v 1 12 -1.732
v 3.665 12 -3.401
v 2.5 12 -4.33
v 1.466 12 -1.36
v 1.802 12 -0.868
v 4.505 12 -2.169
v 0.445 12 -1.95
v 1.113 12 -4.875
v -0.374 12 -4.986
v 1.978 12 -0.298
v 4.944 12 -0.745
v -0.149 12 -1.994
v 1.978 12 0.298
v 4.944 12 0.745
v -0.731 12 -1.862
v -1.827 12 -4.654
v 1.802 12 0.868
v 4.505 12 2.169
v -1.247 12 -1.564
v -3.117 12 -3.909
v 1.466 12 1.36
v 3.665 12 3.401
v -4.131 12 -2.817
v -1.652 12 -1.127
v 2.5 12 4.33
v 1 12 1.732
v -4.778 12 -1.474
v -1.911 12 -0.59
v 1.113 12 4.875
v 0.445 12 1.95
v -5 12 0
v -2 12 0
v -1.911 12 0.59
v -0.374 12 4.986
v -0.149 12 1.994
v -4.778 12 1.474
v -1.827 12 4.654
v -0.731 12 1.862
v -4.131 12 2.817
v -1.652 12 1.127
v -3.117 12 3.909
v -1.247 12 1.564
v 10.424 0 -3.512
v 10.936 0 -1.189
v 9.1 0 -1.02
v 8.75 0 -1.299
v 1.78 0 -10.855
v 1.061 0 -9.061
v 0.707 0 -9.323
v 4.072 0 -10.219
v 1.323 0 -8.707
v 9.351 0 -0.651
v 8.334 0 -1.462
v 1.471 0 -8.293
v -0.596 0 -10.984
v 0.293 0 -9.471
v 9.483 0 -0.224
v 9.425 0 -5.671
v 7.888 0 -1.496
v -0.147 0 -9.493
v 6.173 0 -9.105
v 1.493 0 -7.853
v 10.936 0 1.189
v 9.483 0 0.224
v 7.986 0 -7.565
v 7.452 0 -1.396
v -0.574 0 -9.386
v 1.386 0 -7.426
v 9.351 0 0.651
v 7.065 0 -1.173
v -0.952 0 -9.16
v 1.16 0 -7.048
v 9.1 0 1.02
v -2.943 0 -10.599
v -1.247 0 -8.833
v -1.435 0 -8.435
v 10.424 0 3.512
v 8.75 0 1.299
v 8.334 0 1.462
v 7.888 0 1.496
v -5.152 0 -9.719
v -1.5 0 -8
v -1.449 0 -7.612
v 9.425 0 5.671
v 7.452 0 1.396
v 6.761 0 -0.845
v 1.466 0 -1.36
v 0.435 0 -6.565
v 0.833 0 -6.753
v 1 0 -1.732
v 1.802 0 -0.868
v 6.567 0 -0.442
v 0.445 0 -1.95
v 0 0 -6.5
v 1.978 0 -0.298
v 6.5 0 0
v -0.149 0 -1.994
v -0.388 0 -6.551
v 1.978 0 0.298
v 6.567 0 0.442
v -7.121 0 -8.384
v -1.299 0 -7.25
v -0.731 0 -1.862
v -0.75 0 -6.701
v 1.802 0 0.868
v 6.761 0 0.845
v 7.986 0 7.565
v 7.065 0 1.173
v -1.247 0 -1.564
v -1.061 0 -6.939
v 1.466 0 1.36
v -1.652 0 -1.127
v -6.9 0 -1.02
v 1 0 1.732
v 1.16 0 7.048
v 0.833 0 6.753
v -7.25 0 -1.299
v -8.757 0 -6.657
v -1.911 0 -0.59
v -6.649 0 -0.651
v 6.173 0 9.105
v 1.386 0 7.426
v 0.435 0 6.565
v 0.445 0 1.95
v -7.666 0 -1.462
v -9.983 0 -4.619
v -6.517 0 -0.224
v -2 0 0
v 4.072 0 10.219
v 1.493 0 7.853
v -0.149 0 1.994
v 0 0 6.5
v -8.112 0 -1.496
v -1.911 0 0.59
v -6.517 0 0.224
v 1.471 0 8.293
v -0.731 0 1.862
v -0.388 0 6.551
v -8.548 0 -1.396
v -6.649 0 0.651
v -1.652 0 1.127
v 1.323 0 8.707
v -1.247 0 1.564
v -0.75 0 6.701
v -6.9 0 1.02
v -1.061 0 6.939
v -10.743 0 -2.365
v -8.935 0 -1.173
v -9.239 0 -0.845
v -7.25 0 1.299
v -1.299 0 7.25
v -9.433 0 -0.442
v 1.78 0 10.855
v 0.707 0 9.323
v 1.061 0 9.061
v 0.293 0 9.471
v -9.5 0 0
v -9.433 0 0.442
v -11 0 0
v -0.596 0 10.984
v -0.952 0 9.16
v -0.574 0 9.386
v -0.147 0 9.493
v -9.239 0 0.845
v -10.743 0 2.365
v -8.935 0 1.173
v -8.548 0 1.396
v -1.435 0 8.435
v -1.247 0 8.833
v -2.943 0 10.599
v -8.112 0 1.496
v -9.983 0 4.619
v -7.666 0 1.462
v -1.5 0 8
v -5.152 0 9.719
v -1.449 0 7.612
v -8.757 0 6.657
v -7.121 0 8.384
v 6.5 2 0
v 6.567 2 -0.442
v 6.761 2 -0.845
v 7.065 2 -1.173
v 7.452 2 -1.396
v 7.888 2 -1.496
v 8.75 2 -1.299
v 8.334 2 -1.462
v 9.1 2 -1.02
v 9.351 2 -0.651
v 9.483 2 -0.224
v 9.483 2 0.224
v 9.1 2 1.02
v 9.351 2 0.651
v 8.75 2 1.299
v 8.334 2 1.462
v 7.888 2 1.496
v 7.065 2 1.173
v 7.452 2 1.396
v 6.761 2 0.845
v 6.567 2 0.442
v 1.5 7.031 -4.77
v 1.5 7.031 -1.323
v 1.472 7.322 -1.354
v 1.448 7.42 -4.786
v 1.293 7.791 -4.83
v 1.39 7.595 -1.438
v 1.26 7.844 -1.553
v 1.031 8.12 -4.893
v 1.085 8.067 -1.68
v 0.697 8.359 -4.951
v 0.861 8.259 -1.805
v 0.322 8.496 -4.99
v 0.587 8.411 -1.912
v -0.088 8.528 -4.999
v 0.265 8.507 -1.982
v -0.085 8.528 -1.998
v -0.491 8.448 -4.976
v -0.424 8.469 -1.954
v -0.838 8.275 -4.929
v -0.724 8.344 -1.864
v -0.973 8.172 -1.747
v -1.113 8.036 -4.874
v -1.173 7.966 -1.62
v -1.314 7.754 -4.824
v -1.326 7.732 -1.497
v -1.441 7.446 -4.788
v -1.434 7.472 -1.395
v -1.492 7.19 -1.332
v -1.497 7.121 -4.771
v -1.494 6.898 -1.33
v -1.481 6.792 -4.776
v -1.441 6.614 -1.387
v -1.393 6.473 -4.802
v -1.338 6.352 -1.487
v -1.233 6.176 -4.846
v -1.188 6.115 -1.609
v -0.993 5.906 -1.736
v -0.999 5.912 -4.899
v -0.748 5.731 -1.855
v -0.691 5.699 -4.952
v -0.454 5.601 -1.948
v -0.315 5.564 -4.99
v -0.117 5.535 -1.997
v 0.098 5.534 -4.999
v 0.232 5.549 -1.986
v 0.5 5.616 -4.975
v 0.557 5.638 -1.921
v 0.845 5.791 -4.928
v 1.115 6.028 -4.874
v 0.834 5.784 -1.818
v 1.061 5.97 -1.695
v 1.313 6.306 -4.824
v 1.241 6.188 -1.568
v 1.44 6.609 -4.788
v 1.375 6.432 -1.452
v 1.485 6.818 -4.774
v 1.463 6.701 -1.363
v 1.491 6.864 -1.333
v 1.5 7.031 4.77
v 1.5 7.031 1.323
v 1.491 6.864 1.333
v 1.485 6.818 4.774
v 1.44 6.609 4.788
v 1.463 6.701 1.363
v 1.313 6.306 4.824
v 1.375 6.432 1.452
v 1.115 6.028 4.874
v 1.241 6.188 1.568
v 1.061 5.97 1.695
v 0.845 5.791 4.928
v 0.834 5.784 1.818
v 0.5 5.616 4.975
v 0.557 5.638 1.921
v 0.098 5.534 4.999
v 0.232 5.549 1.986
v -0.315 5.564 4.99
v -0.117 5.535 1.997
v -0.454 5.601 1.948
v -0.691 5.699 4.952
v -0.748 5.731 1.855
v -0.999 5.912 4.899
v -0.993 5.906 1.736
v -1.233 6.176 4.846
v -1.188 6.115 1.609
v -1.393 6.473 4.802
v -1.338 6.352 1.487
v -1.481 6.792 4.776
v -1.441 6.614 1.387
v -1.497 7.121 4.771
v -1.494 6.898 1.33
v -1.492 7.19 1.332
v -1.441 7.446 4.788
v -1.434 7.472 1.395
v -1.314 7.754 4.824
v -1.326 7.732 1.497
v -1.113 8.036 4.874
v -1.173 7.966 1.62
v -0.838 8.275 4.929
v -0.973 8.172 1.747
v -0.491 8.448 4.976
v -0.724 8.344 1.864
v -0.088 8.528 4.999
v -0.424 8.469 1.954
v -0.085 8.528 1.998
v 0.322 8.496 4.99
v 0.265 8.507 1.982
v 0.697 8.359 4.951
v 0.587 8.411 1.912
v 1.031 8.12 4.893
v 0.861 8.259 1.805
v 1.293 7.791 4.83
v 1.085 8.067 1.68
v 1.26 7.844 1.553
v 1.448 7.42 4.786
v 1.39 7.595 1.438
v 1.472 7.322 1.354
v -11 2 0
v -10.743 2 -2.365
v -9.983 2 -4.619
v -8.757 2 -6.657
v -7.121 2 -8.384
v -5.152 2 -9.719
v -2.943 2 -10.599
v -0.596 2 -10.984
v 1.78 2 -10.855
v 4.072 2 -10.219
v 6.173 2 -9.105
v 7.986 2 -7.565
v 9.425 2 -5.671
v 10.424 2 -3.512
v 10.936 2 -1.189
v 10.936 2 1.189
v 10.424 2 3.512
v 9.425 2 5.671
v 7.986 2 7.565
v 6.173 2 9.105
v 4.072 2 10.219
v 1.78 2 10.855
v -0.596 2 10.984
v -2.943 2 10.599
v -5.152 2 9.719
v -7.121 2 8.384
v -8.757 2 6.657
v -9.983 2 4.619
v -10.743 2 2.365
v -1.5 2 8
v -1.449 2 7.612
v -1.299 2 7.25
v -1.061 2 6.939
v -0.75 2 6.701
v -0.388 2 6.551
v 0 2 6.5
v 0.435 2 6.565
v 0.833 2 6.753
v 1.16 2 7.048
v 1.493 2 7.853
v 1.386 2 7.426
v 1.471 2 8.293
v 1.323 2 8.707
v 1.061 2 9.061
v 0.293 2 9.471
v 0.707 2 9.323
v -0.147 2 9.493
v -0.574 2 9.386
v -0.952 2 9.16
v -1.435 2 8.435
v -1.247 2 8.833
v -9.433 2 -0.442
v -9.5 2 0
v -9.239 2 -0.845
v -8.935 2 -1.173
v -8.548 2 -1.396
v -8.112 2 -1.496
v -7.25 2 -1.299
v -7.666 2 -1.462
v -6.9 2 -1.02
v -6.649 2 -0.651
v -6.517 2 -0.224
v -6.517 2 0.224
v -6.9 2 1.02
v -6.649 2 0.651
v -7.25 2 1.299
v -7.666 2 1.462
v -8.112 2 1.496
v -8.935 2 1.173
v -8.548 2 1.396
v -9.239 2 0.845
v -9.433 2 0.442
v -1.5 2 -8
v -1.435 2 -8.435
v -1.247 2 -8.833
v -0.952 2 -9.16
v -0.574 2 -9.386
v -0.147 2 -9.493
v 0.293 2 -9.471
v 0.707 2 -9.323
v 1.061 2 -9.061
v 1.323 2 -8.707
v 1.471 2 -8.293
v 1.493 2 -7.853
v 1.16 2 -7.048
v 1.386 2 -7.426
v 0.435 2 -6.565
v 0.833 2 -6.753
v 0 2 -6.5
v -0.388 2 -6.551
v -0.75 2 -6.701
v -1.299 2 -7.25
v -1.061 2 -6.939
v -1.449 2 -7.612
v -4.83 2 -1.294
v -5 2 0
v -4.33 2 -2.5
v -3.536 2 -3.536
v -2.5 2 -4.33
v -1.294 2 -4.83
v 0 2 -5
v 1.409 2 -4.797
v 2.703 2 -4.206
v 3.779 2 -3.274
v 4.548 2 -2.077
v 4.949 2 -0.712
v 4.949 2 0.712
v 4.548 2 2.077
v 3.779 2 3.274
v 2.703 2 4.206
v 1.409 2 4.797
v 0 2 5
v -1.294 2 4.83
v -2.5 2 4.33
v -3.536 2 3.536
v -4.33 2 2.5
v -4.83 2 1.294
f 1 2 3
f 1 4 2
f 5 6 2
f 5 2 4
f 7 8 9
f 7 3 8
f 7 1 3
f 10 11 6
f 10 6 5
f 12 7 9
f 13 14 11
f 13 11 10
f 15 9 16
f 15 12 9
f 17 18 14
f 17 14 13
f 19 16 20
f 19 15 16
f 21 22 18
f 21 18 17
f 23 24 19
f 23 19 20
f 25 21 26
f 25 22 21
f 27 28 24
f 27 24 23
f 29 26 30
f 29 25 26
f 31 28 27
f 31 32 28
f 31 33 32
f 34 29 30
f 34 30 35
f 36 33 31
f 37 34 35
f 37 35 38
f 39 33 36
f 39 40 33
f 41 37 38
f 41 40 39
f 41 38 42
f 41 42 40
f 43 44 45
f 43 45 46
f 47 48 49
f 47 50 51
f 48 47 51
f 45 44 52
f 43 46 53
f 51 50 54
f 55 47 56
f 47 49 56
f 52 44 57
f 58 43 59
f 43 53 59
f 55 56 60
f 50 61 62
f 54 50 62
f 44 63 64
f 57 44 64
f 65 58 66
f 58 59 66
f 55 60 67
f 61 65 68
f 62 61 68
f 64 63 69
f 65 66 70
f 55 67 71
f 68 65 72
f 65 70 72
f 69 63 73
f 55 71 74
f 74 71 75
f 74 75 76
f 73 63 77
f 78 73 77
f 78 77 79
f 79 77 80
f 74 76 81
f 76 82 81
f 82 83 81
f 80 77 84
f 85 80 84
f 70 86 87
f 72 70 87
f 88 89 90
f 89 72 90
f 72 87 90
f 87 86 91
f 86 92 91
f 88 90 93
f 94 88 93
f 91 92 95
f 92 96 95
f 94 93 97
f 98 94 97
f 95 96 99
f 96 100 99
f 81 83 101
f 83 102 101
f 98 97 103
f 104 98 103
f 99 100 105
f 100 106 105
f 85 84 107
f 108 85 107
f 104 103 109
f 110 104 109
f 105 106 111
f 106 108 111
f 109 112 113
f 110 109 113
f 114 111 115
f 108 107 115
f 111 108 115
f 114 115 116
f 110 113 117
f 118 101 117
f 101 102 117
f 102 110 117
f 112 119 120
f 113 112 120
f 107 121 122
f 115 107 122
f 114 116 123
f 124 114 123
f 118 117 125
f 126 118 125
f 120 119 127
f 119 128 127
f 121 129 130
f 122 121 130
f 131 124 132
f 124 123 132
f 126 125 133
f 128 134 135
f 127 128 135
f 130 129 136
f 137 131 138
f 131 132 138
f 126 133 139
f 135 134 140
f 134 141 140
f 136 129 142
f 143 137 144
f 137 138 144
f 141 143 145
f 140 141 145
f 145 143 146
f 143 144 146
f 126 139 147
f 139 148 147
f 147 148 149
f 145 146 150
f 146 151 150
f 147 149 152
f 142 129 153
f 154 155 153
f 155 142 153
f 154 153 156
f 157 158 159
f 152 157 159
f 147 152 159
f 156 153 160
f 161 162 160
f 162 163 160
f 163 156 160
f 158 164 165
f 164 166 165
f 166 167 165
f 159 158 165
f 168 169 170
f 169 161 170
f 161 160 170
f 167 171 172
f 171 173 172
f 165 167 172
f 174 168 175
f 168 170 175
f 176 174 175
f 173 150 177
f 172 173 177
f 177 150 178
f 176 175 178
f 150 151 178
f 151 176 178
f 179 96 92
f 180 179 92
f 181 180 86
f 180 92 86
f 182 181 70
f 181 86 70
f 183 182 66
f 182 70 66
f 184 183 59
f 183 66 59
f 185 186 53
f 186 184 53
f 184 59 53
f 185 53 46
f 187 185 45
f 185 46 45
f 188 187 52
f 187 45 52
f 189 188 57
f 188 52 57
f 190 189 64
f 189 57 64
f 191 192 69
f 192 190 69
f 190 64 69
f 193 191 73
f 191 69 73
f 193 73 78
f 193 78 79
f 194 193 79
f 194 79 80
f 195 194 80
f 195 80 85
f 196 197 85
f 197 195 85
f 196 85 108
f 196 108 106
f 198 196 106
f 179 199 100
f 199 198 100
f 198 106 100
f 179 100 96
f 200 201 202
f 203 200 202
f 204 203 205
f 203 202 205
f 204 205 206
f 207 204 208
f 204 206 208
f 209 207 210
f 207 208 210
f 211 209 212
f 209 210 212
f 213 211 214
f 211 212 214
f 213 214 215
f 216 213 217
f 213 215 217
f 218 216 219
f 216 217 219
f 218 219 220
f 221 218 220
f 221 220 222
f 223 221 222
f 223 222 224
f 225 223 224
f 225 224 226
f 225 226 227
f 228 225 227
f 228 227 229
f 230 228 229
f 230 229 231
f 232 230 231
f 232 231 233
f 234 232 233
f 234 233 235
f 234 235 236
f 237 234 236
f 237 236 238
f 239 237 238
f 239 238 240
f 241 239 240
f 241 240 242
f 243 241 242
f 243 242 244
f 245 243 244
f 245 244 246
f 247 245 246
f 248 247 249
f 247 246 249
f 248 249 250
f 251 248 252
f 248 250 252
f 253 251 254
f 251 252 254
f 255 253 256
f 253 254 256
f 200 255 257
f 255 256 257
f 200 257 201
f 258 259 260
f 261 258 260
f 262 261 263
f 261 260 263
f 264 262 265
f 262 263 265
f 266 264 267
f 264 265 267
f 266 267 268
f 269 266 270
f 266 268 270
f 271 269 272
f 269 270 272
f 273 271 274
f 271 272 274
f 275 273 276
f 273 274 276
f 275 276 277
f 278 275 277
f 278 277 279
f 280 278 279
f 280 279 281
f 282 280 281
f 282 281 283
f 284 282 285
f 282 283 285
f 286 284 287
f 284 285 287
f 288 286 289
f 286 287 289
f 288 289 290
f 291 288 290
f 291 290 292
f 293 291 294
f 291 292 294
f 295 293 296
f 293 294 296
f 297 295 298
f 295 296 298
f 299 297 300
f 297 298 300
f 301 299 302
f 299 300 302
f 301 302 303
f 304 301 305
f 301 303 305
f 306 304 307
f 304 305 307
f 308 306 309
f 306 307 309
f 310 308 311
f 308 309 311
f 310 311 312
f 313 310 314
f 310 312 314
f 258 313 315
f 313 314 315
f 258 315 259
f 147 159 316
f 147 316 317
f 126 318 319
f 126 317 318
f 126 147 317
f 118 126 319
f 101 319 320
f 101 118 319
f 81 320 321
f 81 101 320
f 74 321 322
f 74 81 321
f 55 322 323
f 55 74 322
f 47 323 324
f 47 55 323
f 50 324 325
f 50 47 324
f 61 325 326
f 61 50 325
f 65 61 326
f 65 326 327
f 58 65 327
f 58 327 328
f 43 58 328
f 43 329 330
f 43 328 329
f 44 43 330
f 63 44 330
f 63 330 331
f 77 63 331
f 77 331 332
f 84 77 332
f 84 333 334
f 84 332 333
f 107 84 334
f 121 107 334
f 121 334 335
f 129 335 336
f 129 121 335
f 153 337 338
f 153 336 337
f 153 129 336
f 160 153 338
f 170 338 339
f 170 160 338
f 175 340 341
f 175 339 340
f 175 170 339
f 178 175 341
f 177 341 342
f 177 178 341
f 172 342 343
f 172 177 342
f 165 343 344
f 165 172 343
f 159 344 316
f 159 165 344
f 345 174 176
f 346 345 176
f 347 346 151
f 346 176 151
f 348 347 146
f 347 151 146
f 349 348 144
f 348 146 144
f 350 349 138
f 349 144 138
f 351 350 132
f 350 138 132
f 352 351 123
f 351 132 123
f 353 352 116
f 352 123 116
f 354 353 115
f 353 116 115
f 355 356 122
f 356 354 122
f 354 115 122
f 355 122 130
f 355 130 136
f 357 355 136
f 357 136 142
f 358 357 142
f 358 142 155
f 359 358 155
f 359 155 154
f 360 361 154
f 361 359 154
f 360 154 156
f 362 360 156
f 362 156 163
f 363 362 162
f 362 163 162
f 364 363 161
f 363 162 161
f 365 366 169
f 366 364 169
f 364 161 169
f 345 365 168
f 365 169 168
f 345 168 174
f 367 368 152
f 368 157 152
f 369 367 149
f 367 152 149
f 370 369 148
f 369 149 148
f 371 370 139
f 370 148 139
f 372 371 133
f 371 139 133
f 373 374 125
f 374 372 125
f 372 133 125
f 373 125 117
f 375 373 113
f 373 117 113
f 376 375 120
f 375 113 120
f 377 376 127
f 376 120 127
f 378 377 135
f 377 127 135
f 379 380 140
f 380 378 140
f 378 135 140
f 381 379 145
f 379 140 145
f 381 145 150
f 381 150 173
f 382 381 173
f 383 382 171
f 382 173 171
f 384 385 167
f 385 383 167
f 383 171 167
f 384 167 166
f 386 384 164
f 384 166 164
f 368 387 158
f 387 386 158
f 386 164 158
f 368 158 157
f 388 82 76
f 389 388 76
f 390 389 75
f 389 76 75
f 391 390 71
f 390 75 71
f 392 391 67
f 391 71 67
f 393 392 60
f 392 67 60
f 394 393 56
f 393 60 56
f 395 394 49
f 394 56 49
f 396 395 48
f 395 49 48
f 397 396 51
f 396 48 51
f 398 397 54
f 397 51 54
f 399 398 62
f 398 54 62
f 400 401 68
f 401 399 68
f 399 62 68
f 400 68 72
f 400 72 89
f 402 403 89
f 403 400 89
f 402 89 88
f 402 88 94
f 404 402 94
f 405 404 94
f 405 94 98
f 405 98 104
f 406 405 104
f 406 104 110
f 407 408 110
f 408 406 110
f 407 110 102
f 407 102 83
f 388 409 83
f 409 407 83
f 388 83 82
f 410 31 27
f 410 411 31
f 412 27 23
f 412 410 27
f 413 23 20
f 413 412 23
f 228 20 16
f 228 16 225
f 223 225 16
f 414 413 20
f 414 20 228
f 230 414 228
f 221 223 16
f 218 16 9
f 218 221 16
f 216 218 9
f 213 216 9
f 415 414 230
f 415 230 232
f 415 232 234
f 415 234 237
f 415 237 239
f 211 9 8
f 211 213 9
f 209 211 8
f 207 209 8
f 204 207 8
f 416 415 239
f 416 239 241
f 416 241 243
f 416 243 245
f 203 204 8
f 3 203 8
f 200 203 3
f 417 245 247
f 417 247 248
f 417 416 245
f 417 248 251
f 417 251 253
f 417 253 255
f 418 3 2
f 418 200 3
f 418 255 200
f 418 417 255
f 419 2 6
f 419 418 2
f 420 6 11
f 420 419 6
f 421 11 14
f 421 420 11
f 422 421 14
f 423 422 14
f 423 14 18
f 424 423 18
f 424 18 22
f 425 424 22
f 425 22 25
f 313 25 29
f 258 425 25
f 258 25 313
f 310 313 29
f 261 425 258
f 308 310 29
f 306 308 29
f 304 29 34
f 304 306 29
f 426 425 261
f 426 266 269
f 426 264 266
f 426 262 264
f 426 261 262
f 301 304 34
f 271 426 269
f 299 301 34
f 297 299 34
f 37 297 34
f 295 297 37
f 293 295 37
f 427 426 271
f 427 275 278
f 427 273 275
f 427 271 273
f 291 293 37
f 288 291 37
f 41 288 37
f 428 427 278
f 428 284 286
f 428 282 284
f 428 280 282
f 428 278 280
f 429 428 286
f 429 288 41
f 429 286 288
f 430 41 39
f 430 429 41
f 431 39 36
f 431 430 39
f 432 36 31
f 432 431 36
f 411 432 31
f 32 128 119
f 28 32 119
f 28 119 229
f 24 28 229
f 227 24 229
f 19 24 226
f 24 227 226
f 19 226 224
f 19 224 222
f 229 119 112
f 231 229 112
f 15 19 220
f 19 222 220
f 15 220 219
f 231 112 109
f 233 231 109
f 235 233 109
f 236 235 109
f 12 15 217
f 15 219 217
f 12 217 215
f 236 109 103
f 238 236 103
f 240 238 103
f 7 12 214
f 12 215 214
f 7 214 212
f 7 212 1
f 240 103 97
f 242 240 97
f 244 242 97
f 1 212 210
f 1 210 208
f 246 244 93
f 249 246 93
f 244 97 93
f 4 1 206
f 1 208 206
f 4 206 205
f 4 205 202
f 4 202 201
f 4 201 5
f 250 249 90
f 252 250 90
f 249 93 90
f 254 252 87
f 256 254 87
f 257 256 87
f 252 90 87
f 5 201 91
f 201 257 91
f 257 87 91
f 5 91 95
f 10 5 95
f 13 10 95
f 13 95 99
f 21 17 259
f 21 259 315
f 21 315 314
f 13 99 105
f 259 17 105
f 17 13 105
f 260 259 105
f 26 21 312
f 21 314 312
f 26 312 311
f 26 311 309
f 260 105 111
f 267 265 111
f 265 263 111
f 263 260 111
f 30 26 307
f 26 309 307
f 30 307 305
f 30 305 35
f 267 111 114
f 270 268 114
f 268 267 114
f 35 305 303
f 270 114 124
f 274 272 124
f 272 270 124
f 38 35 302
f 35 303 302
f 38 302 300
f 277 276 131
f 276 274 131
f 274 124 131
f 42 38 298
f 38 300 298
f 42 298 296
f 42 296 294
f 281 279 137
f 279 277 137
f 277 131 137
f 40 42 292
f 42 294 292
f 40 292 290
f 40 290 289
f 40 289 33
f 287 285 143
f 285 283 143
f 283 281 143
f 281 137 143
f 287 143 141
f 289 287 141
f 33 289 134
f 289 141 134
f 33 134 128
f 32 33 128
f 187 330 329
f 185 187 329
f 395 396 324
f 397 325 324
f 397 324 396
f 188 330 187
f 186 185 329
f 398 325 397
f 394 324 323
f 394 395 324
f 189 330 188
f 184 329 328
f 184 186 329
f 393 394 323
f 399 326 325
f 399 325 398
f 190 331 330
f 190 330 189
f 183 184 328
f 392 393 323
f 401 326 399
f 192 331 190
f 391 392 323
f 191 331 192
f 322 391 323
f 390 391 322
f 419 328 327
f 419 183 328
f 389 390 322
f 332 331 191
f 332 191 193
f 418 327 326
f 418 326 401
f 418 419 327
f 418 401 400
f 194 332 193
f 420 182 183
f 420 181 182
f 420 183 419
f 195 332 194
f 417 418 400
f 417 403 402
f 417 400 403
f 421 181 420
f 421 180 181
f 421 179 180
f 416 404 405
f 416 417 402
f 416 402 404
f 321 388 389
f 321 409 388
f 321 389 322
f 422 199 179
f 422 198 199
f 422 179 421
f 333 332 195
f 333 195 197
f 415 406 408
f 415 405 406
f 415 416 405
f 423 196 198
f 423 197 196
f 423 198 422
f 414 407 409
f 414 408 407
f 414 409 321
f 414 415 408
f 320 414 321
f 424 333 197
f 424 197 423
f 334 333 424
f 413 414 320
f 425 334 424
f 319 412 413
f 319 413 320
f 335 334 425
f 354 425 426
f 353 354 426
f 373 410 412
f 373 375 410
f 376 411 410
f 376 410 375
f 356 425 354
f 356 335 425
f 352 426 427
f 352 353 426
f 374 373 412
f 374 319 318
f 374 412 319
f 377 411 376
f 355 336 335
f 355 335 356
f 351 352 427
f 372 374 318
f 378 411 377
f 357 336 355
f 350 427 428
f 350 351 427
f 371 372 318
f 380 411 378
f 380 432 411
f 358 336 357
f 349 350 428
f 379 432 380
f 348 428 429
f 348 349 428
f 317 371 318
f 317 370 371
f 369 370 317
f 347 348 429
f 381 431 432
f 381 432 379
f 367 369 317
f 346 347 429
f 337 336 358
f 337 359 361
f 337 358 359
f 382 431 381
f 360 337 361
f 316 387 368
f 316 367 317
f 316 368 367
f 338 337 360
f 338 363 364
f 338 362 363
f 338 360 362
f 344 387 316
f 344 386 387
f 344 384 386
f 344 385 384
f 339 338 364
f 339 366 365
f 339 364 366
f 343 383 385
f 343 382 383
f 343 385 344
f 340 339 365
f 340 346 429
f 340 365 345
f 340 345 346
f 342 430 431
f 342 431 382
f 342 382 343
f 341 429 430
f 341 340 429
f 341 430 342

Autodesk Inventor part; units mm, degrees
ref_plane "YZ Plane" through (0, 0, 0) normal (1, 0, 0) x (0, 1, 0)
ref_plane "XZ Plane" through (0, 0, 0) normal (0, 1, 0) x (-1, 0, 0)
ref_plane "XY Plane" through (0, 0, 0) normal (0, 0, 1) x (1, 0, 0)
sketch "Sketch1" plane through (0, 0, 0) normal (0, 1, 0) x (-1, 0, 0)
  circle A0 centre (0, 0) radius 11
  circle A1 centre (0, 0) radius 5
  circle A2 centre (0, 0) radius 2
  line L0 (0, 0) -> (0, -8)
  line L1 (0, 0) -> (0, 8)
  circle A3 centre (0, 8) radius 1.5
  circle A4 centre (0, -8) radius 1.5
  circle A5 centre (-8, 0) radius 1.5
  circle A6 centre (0, -8) radius 1.5
  circle A7 centre (8, 0) radius 1.5
  dimension "d0" = 22
  dimension "d1" = 10
  dimension "d2" = 4
  dimension "d3" = 8
  dimension "d4" = 8
  dimension "d5" = 3
  dimension "d6" = 3
  dimension "d9" = 360
extrude "Extrusion1" add sketch "Sketch1" along normal blind 2
extrude "Extrusion2" add sketch "Sketch1" along normal blind 12 contours A1 L0 A2 L1 | L1 A2 L0 A1
sketch "Sketch2" plane through (0, 0, 0) normal (0, 0, 1) x (1, 0, 0)
  circle A0 centre (0, 7.0307) radius 1.5
  point P0 (0, 0)
  dimension "d15" = 3
extrude "Extrusion3" cut sketch "Sketch2" along normal mid plane 12
sketch "Sketch3" plane through (0, 0, 0) normal (0, -1, 0) x (1, 0, 0)
  circle A0 centre (0, 0) radius 2
  circle A1 centre (-8, 0) radius 1.5 projected
  circle A2 centre (-8, 0) radius 1.5
  circle A3 centre (0, -8) radius 1.5 projected
  circle A4 centre (0, -8) radius 1.5
  circle A5 centre (8, 0) radius 1.5 projected
  circle A6 centre (8, 0) radius 1.5
  circle A7 centre (0, 8) radius 1.5 projected
  circle A8 centre (0, 8) radius 1.5
  circle A9 centre (0, 0) radius 11.0573
properties part number "hub 4mm" material "Copper"
